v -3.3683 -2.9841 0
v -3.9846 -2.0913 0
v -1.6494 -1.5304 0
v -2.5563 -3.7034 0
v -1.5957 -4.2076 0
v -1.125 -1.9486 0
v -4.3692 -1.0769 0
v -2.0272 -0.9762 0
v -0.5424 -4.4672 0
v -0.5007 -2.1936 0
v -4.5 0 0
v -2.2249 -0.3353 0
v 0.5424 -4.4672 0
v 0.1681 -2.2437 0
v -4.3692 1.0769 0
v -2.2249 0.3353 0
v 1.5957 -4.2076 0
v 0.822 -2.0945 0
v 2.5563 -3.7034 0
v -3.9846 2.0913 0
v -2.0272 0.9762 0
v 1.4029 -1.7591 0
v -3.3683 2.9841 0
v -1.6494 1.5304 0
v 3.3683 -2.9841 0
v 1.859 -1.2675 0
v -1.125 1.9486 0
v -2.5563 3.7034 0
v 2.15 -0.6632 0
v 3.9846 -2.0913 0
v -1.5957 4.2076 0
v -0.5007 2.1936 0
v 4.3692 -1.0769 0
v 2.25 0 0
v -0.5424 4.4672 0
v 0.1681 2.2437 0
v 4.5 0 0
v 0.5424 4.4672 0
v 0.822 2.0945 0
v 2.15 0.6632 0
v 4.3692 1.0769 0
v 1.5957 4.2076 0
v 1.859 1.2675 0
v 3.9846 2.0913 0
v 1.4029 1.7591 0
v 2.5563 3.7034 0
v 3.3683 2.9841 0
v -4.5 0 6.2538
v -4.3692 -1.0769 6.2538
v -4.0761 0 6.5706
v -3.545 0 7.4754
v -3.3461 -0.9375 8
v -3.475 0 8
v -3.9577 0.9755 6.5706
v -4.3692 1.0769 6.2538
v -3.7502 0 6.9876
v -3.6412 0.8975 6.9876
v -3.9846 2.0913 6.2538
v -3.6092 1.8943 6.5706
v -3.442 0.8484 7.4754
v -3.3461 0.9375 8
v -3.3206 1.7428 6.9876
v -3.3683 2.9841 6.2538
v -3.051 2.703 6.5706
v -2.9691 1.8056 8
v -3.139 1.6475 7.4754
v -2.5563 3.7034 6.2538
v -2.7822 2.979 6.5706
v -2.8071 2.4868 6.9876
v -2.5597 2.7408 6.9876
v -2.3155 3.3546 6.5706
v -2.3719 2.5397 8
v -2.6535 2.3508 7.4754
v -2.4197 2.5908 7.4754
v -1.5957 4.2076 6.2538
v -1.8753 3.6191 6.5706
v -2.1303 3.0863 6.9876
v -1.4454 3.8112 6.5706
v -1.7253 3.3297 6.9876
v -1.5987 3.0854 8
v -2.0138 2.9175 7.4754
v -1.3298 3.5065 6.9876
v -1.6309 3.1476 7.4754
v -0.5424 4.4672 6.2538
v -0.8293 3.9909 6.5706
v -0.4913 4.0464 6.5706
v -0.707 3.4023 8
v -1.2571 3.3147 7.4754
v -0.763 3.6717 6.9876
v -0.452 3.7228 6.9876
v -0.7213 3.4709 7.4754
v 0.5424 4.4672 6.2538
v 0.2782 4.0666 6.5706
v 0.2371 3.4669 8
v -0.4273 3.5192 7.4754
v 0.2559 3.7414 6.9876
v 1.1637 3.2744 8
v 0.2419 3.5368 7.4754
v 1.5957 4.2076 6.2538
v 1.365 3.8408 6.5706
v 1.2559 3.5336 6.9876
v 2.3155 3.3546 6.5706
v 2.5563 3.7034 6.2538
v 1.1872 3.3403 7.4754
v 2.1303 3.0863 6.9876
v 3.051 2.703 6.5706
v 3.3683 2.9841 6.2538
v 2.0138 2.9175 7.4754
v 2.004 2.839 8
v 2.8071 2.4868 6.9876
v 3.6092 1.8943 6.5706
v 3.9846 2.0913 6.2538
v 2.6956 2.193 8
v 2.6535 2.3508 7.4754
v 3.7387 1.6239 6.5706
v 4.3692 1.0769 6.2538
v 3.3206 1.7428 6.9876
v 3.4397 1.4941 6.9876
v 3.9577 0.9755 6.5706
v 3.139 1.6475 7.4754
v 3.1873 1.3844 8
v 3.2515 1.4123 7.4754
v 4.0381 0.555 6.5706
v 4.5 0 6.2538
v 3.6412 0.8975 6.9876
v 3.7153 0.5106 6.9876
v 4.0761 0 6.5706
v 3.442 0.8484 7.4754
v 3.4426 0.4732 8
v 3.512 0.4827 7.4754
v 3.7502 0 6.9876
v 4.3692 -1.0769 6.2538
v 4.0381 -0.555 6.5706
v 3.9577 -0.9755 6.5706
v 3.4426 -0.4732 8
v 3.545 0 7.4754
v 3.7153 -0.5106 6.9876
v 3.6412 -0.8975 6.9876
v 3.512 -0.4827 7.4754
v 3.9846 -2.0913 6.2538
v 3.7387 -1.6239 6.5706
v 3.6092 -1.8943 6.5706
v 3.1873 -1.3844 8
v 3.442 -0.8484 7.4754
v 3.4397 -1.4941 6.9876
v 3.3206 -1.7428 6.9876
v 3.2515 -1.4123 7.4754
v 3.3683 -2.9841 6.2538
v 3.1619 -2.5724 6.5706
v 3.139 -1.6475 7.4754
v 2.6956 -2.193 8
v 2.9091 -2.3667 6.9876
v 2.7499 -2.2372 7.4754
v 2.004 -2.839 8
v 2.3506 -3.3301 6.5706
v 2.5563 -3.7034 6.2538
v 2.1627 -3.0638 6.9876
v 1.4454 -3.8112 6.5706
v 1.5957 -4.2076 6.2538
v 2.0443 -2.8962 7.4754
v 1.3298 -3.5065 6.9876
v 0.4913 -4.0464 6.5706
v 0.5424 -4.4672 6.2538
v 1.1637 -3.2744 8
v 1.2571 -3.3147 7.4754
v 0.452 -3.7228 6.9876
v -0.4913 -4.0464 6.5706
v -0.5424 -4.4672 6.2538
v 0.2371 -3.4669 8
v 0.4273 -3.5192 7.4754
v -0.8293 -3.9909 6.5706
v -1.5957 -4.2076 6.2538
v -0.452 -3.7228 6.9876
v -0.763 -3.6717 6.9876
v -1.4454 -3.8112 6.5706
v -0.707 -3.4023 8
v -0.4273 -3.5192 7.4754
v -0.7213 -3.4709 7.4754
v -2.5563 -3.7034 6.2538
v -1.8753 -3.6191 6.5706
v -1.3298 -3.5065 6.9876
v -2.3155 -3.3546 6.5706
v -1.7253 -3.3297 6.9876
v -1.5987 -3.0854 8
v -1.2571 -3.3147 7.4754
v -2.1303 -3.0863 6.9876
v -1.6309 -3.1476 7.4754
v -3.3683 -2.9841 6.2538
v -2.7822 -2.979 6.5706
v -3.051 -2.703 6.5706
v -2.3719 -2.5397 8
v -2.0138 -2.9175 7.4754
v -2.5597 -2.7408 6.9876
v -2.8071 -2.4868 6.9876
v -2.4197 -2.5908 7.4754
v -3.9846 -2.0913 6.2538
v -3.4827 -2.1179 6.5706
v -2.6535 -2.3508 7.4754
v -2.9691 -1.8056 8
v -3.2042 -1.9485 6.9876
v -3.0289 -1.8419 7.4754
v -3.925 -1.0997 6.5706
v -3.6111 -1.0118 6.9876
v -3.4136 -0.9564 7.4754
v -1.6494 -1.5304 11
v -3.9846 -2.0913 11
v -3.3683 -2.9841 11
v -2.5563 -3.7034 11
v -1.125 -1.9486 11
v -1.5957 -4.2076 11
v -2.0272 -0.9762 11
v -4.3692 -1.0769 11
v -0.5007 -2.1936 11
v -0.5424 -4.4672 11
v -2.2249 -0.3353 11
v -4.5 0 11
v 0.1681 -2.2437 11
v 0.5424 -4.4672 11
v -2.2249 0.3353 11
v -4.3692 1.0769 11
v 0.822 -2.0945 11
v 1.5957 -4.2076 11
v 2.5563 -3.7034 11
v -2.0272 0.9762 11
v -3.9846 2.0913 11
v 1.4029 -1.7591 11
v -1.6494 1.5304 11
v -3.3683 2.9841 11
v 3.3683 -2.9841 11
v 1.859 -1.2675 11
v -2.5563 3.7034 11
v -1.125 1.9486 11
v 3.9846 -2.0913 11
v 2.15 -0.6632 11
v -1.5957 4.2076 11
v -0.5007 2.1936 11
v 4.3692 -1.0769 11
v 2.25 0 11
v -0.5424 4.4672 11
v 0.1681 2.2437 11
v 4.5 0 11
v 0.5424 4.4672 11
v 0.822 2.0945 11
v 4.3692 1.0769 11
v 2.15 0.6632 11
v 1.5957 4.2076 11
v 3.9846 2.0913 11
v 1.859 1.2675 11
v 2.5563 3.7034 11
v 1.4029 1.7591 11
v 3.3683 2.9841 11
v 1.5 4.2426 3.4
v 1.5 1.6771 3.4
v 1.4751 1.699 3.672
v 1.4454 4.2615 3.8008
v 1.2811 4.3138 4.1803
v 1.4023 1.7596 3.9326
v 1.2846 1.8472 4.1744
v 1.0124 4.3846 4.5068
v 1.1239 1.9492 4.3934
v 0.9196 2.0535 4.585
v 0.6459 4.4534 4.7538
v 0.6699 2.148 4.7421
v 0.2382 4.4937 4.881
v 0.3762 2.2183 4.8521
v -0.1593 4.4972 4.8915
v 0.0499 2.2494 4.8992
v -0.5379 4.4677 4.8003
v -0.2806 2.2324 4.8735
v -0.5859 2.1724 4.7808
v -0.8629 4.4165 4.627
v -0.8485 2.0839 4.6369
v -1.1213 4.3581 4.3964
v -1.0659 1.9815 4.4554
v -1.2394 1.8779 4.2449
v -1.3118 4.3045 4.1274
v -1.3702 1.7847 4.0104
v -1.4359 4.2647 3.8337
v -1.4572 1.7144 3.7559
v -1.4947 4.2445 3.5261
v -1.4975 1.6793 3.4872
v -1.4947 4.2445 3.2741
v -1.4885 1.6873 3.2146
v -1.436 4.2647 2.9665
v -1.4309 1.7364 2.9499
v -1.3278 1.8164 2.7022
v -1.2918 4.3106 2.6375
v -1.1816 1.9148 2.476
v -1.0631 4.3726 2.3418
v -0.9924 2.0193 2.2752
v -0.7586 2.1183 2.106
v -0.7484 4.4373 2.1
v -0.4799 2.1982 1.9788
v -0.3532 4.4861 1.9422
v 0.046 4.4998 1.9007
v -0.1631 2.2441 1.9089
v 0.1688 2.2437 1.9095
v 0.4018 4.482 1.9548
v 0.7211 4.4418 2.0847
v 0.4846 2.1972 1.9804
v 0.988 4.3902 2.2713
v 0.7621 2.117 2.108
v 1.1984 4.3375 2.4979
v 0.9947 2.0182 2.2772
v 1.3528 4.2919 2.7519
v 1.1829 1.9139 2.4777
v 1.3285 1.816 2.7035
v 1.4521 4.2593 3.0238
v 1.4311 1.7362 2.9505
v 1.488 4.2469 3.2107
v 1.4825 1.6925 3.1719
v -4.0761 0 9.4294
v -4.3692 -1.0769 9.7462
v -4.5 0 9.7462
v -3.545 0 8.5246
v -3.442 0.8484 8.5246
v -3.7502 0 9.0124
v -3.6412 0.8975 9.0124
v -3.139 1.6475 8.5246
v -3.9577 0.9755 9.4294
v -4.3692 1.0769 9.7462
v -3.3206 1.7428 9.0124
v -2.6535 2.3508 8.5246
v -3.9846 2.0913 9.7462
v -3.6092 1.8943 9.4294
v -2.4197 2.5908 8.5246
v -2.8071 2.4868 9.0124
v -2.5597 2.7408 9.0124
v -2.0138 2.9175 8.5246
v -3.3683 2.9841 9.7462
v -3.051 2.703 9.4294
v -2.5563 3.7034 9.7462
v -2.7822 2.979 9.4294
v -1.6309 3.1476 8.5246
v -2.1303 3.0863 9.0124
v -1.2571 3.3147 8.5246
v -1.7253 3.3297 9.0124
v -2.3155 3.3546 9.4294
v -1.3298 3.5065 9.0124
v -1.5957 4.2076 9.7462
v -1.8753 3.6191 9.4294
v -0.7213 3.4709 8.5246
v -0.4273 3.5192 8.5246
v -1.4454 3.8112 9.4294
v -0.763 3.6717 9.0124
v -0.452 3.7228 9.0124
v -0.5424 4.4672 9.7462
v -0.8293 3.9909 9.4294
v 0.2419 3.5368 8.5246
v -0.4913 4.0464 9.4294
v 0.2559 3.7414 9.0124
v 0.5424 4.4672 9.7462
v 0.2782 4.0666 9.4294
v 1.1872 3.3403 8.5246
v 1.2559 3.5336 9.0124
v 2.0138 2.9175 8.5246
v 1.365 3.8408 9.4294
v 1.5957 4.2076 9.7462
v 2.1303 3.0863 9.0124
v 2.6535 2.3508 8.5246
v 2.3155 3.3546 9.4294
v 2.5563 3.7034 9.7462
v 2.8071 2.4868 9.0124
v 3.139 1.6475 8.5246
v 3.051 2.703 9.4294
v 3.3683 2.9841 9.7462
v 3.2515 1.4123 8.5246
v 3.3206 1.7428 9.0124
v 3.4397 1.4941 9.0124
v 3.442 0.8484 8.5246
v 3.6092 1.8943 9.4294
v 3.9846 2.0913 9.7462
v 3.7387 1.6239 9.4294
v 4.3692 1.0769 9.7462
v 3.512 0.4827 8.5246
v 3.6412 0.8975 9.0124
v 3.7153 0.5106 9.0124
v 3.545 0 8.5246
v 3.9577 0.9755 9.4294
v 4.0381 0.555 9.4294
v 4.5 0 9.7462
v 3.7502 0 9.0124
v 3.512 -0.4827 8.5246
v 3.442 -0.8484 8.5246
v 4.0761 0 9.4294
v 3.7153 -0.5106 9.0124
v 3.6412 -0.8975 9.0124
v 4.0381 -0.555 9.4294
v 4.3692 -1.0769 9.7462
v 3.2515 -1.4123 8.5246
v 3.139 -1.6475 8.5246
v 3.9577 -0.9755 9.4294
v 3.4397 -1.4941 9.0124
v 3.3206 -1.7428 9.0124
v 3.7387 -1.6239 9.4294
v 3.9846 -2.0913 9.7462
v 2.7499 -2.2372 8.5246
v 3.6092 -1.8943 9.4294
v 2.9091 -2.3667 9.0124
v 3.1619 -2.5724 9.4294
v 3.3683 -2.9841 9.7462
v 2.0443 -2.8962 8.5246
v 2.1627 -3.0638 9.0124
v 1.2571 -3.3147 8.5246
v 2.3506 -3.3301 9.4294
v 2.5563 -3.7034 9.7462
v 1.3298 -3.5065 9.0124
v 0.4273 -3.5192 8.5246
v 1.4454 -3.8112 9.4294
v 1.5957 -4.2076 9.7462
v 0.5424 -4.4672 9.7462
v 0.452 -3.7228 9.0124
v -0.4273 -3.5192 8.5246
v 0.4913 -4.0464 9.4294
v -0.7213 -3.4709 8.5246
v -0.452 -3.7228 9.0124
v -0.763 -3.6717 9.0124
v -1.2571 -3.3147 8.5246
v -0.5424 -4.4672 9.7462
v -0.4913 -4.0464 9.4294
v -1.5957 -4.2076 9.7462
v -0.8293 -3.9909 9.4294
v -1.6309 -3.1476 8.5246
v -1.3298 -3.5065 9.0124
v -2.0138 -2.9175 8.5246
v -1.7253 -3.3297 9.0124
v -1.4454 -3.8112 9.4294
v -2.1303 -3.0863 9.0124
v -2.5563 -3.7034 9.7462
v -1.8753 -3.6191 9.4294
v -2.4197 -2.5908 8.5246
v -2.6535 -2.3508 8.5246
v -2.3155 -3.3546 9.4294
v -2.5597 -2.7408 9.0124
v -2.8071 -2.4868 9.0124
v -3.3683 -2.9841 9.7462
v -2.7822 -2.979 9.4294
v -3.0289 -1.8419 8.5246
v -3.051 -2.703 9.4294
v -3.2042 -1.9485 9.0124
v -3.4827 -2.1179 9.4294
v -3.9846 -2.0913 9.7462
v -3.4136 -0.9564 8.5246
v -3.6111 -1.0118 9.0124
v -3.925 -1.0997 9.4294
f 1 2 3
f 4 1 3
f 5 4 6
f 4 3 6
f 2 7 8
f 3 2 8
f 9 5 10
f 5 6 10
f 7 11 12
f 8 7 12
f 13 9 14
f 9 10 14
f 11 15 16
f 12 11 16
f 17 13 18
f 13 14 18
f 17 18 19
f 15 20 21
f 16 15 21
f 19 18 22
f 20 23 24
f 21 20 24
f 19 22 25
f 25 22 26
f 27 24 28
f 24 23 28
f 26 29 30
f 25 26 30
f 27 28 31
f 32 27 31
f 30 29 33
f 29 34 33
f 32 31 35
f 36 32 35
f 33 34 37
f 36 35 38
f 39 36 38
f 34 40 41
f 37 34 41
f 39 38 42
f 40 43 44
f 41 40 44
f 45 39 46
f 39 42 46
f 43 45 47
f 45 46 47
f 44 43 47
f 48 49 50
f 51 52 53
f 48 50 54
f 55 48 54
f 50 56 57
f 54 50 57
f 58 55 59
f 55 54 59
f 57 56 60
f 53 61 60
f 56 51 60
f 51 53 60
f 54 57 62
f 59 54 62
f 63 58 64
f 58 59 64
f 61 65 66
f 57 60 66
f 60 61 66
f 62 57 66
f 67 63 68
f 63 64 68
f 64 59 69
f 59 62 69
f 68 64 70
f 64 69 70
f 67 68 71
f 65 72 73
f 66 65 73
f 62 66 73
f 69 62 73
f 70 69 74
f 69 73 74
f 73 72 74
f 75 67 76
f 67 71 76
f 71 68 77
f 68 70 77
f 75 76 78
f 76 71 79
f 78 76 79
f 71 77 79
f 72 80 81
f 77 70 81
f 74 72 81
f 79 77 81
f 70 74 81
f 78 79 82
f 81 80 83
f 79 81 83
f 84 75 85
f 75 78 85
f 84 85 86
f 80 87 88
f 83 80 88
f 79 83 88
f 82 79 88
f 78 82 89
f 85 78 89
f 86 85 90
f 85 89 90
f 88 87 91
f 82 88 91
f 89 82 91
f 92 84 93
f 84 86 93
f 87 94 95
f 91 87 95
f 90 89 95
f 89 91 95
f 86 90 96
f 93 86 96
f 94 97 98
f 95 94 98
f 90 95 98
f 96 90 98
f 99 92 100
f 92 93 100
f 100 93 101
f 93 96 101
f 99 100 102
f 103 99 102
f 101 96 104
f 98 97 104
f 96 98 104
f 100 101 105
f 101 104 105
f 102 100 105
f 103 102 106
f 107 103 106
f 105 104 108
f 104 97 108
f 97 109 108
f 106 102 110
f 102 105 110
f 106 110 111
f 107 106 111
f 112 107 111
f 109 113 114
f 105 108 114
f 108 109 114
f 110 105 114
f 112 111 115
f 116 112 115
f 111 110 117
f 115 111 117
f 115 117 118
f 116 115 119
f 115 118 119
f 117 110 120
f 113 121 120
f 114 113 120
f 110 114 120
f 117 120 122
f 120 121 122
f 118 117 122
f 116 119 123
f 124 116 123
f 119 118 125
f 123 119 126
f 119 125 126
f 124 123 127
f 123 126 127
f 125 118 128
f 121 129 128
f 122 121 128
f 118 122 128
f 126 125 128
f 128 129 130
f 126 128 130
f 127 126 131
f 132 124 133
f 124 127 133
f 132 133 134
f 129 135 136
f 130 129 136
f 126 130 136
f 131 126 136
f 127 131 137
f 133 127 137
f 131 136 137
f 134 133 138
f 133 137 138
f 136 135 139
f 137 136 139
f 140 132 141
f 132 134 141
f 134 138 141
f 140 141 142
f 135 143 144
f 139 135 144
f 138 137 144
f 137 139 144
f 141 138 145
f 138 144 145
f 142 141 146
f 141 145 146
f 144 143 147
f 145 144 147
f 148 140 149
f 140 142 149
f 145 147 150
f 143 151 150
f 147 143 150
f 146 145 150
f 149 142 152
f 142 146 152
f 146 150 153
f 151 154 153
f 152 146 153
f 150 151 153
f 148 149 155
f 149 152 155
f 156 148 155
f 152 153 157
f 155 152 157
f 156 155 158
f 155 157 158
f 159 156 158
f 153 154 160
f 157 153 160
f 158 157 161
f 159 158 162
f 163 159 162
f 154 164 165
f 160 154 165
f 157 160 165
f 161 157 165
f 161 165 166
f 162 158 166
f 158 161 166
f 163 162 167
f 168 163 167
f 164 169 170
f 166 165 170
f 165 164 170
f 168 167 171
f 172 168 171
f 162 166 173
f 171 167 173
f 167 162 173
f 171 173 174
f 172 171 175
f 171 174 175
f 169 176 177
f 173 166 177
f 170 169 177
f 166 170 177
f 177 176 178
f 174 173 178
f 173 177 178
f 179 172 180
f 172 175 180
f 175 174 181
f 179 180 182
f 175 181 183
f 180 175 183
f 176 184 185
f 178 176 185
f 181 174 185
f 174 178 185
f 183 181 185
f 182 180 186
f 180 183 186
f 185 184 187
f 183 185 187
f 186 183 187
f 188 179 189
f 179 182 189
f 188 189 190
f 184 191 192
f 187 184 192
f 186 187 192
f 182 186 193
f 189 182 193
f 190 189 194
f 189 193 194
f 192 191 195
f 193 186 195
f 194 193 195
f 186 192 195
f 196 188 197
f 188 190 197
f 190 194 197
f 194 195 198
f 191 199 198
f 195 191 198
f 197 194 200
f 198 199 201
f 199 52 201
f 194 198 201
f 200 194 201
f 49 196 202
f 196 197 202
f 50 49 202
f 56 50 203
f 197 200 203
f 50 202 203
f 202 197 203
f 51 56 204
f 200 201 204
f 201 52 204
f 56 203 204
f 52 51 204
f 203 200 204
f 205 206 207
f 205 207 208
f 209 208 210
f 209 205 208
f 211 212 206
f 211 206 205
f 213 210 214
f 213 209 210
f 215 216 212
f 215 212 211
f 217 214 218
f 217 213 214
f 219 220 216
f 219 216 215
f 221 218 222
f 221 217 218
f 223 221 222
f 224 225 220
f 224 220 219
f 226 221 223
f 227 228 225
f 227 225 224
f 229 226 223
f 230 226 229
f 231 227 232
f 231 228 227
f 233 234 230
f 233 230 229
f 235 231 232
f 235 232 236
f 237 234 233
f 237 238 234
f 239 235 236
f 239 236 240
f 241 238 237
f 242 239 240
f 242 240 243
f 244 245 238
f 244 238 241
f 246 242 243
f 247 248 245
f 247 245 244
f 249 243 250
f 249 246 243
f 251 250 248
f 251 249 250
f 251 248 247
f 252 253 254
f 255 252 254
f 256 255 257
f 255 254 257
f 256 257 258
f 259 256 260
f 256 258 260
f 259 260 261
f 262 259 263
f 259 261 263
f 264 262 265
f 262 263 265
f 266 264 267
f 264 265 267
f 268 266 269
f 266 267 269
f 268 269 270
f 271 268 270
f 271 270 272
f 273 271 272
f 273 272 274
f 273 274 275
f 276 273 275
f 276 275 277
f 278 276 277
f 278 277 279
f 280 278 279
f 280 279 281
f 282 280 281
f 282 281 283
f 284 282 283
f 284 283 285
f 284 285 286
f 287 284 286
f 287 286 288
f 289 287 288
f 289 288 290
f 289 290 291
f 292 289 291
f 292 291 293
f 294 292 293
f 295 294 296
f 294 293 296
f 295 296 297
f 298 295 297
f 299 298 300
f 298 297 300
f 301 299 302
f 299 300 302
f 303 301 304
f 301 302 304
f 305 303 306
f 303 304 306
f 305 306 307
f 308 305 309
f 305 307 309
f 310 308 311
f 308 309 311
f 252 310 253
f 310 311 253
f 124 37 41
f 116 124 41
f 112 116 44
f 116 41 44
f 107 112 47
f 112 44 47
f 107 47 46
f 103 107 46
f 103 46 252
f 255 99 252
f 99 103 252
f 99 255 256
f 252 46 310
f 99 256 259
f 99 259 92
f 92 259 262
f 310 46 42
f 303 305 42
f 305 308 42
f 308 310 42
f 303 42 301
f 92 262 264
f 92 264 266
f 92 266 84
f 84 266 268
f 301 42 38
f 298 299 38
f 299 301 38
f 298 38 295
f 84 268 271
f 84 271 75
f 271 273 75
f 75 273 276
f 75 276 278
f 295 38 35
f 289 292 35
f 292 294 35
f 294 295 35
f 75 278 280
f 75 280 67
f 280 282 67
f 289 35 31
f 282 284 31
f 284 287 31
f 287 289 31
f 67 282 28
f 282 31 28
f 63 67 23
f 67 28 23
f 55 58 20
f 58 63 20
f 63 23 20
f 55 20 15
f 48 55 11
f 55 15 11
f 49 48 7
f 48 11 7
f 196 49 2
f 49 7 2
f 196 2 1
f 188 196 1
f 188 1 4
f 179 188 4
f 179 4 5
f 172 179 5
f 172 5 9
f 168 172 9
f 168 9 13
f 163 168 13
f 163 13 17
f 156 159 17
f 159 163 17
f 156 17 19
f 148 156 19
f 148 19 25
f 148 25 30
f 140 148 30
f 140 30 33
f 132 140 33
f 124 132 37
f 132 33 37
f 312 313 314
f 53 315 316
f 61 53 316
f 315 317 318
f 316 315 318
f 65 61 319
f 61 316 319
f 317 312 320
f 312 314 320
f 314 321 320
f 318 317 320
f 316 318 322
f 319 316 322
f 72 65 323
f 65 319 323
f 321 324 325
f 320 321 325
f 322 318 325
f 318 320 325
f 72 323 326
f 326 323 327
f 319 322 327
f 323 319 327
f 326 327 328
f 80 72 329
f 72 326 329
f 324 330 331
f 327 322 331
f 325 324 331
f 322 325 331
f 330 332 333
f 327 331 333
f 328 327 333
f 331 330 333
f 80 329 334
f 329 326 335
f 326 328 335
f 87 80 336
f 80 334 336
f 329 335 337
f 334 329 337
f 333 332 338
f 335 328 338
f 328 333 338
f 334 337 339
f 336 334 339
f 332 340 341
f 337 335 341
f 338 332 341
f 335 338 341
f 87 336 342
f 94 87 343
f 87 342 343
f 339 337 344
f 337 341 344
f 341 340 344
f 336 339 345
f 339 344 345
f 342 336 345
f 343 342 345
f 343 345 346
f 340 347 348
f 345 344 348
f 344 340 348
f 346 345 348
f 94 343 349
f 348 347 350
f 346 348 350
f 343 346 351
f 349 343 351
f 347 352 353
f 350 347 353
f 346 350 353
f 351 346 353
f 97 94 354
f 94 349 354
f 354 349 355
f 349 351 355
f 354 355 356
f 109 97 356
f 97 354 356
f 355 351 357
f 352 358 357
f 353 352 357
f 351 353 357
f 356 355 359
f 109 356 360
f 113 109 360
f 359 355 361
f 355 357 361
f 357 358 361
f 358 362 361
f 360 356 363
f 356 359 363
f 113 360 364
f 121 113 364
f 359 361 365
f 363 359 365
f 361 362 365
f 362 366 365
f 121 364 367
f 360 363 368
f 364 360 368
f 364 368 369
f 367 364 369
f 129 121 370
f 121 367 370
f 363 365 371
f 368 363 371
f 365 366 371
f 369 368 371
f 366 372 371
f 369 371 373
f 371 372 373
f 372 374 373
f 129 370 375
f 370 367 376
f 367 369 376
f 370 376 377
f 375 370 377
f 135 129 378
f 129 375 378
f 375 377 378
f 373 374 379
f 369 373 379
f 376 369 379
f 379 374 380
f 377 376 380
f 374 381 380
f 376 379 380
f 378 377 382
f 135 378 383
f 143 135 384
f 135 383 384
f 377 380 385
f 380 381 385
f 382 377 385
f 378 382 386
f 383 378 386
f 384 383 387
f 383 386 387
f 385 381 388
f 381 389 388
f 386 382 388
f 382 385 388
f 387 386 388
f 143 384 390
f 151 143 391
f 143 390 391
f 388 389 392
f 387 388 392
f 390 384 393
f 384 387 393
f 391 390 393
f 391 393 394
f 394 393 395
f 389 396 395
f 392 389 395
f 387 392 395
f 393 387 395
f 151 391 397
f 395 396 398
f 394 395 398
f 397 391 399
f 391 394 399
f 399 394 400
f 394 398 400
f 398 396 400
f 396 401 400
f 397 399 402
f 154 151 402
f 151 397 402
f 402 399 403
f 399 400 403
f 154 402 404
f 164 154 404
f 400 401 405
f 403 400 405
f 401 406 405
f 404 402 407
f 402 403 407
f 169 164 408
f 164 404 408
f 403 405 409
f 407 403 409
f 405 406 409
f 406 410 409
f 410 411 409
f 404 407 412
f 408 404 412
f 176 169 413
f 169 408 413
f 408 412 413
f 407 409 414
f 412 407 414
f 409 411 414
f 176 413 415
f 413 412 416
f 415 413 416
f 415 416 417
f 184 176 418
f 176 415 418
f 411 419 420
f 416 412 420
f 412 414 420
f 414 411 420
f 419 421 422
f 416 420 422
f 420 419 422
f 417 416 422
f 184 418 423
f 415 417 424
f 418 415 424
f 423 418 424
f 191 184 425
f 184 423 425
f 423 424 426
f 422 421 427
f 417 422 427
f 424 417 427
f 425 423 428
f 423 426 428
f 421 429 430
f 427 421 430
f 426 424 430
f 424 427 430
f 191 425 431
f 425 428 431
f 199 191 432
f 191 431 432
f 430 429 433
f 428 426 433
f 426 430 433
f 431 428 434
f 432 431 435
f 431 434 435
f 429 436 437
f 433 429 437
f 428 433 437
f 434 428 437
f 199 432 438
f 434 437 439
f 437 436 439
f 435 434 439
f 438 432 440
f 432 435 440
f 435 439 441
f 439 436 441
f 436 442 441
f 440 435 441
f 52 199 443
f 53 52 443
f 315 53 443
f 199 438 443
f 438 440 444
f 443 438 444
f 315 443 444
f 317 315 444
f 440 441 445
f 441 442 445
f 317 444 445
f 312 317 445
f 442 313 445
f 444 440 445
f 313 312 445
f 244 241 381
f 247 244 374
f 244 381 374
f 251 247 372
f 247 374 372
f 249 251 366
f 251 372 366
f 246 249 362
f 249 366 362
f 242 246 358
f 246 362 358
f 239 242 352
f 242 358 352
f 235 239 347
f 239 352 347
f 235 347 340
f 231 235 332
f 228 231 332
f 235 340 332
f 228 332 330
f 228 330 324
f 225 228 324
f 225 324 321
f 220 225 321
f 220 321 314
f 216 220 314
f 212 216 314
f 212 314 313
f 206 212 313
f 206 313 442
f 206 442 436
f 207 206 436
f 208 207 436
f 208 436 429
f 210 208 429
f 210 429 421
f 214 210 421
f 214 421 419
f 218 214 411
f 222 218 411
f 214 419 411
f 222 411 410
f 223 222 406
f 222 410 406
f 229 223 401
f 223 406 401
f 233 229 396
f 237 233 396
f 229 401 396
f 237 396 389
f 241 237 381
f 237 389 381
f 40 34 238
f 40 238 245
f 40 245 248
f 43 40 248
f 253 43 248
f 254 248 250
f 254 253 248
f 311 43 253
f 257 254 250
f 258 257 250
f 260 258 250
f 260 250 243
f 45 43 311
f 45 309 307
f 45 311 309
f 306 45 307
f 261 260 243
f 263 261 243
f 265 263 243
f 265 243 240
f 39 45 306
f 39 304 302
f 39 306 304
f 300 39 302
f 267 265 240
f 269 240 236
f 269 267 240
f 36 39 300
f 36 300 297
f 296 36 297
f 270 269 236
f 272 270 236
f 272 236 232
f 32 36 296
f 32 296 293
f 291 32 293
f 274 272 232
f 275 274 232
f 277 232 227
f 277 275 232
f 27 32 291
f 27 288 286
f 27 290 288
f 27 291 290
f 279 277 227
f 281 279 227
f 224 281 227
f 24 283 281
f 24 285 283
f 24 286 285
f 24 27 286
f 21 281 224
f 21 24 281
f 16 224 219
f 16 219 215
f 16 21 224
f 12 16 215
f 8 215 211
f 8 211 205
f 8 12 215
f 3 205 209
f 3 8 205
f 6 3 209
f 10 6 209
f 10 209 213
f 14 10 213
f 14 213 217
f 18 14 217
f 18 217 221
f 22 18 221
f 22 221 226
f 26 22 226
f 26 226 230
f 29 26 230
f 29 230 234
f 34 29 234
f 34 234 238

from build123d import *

# Parameters (mm, degrees)
F0_R     = 4.5
F0_R_2   = 2.25
F1_DEPTH = 11
F2_R     = 1.5
F3_DEPTH = 4.501
F2_R_2   = 2


with BuildPart() as f1:
    # F0 (on Top) → F1 (new body)
    with BuildSketch(Plane.XY):
        Circle(F0_R)
        Circle(F0_R_2, mode=Mode.SUBTRACT)
    extrude(amount=F1_DEPTH)

    # F2 (on Front) → F3 (cut, through all)
    with BuildSketch(Plane.XZ):
        with Locations((0, 3.4)):
            Circle(F2_R)
    extrude(amount=-F3_DEPTH, mode=Mode.SUBTRACT)

    # F2 (on Front) → F4 (revolve, cut)
    with BuildSketch(Plane.XZ):
        with Locations((-5.475, 8)):
            Circle(F2_R_2)
    revolve(axis=Axis((0, 0, 6.367243), (0, 0, -1)), mode=Mode.SUBTRACT)


solid = f1.part
